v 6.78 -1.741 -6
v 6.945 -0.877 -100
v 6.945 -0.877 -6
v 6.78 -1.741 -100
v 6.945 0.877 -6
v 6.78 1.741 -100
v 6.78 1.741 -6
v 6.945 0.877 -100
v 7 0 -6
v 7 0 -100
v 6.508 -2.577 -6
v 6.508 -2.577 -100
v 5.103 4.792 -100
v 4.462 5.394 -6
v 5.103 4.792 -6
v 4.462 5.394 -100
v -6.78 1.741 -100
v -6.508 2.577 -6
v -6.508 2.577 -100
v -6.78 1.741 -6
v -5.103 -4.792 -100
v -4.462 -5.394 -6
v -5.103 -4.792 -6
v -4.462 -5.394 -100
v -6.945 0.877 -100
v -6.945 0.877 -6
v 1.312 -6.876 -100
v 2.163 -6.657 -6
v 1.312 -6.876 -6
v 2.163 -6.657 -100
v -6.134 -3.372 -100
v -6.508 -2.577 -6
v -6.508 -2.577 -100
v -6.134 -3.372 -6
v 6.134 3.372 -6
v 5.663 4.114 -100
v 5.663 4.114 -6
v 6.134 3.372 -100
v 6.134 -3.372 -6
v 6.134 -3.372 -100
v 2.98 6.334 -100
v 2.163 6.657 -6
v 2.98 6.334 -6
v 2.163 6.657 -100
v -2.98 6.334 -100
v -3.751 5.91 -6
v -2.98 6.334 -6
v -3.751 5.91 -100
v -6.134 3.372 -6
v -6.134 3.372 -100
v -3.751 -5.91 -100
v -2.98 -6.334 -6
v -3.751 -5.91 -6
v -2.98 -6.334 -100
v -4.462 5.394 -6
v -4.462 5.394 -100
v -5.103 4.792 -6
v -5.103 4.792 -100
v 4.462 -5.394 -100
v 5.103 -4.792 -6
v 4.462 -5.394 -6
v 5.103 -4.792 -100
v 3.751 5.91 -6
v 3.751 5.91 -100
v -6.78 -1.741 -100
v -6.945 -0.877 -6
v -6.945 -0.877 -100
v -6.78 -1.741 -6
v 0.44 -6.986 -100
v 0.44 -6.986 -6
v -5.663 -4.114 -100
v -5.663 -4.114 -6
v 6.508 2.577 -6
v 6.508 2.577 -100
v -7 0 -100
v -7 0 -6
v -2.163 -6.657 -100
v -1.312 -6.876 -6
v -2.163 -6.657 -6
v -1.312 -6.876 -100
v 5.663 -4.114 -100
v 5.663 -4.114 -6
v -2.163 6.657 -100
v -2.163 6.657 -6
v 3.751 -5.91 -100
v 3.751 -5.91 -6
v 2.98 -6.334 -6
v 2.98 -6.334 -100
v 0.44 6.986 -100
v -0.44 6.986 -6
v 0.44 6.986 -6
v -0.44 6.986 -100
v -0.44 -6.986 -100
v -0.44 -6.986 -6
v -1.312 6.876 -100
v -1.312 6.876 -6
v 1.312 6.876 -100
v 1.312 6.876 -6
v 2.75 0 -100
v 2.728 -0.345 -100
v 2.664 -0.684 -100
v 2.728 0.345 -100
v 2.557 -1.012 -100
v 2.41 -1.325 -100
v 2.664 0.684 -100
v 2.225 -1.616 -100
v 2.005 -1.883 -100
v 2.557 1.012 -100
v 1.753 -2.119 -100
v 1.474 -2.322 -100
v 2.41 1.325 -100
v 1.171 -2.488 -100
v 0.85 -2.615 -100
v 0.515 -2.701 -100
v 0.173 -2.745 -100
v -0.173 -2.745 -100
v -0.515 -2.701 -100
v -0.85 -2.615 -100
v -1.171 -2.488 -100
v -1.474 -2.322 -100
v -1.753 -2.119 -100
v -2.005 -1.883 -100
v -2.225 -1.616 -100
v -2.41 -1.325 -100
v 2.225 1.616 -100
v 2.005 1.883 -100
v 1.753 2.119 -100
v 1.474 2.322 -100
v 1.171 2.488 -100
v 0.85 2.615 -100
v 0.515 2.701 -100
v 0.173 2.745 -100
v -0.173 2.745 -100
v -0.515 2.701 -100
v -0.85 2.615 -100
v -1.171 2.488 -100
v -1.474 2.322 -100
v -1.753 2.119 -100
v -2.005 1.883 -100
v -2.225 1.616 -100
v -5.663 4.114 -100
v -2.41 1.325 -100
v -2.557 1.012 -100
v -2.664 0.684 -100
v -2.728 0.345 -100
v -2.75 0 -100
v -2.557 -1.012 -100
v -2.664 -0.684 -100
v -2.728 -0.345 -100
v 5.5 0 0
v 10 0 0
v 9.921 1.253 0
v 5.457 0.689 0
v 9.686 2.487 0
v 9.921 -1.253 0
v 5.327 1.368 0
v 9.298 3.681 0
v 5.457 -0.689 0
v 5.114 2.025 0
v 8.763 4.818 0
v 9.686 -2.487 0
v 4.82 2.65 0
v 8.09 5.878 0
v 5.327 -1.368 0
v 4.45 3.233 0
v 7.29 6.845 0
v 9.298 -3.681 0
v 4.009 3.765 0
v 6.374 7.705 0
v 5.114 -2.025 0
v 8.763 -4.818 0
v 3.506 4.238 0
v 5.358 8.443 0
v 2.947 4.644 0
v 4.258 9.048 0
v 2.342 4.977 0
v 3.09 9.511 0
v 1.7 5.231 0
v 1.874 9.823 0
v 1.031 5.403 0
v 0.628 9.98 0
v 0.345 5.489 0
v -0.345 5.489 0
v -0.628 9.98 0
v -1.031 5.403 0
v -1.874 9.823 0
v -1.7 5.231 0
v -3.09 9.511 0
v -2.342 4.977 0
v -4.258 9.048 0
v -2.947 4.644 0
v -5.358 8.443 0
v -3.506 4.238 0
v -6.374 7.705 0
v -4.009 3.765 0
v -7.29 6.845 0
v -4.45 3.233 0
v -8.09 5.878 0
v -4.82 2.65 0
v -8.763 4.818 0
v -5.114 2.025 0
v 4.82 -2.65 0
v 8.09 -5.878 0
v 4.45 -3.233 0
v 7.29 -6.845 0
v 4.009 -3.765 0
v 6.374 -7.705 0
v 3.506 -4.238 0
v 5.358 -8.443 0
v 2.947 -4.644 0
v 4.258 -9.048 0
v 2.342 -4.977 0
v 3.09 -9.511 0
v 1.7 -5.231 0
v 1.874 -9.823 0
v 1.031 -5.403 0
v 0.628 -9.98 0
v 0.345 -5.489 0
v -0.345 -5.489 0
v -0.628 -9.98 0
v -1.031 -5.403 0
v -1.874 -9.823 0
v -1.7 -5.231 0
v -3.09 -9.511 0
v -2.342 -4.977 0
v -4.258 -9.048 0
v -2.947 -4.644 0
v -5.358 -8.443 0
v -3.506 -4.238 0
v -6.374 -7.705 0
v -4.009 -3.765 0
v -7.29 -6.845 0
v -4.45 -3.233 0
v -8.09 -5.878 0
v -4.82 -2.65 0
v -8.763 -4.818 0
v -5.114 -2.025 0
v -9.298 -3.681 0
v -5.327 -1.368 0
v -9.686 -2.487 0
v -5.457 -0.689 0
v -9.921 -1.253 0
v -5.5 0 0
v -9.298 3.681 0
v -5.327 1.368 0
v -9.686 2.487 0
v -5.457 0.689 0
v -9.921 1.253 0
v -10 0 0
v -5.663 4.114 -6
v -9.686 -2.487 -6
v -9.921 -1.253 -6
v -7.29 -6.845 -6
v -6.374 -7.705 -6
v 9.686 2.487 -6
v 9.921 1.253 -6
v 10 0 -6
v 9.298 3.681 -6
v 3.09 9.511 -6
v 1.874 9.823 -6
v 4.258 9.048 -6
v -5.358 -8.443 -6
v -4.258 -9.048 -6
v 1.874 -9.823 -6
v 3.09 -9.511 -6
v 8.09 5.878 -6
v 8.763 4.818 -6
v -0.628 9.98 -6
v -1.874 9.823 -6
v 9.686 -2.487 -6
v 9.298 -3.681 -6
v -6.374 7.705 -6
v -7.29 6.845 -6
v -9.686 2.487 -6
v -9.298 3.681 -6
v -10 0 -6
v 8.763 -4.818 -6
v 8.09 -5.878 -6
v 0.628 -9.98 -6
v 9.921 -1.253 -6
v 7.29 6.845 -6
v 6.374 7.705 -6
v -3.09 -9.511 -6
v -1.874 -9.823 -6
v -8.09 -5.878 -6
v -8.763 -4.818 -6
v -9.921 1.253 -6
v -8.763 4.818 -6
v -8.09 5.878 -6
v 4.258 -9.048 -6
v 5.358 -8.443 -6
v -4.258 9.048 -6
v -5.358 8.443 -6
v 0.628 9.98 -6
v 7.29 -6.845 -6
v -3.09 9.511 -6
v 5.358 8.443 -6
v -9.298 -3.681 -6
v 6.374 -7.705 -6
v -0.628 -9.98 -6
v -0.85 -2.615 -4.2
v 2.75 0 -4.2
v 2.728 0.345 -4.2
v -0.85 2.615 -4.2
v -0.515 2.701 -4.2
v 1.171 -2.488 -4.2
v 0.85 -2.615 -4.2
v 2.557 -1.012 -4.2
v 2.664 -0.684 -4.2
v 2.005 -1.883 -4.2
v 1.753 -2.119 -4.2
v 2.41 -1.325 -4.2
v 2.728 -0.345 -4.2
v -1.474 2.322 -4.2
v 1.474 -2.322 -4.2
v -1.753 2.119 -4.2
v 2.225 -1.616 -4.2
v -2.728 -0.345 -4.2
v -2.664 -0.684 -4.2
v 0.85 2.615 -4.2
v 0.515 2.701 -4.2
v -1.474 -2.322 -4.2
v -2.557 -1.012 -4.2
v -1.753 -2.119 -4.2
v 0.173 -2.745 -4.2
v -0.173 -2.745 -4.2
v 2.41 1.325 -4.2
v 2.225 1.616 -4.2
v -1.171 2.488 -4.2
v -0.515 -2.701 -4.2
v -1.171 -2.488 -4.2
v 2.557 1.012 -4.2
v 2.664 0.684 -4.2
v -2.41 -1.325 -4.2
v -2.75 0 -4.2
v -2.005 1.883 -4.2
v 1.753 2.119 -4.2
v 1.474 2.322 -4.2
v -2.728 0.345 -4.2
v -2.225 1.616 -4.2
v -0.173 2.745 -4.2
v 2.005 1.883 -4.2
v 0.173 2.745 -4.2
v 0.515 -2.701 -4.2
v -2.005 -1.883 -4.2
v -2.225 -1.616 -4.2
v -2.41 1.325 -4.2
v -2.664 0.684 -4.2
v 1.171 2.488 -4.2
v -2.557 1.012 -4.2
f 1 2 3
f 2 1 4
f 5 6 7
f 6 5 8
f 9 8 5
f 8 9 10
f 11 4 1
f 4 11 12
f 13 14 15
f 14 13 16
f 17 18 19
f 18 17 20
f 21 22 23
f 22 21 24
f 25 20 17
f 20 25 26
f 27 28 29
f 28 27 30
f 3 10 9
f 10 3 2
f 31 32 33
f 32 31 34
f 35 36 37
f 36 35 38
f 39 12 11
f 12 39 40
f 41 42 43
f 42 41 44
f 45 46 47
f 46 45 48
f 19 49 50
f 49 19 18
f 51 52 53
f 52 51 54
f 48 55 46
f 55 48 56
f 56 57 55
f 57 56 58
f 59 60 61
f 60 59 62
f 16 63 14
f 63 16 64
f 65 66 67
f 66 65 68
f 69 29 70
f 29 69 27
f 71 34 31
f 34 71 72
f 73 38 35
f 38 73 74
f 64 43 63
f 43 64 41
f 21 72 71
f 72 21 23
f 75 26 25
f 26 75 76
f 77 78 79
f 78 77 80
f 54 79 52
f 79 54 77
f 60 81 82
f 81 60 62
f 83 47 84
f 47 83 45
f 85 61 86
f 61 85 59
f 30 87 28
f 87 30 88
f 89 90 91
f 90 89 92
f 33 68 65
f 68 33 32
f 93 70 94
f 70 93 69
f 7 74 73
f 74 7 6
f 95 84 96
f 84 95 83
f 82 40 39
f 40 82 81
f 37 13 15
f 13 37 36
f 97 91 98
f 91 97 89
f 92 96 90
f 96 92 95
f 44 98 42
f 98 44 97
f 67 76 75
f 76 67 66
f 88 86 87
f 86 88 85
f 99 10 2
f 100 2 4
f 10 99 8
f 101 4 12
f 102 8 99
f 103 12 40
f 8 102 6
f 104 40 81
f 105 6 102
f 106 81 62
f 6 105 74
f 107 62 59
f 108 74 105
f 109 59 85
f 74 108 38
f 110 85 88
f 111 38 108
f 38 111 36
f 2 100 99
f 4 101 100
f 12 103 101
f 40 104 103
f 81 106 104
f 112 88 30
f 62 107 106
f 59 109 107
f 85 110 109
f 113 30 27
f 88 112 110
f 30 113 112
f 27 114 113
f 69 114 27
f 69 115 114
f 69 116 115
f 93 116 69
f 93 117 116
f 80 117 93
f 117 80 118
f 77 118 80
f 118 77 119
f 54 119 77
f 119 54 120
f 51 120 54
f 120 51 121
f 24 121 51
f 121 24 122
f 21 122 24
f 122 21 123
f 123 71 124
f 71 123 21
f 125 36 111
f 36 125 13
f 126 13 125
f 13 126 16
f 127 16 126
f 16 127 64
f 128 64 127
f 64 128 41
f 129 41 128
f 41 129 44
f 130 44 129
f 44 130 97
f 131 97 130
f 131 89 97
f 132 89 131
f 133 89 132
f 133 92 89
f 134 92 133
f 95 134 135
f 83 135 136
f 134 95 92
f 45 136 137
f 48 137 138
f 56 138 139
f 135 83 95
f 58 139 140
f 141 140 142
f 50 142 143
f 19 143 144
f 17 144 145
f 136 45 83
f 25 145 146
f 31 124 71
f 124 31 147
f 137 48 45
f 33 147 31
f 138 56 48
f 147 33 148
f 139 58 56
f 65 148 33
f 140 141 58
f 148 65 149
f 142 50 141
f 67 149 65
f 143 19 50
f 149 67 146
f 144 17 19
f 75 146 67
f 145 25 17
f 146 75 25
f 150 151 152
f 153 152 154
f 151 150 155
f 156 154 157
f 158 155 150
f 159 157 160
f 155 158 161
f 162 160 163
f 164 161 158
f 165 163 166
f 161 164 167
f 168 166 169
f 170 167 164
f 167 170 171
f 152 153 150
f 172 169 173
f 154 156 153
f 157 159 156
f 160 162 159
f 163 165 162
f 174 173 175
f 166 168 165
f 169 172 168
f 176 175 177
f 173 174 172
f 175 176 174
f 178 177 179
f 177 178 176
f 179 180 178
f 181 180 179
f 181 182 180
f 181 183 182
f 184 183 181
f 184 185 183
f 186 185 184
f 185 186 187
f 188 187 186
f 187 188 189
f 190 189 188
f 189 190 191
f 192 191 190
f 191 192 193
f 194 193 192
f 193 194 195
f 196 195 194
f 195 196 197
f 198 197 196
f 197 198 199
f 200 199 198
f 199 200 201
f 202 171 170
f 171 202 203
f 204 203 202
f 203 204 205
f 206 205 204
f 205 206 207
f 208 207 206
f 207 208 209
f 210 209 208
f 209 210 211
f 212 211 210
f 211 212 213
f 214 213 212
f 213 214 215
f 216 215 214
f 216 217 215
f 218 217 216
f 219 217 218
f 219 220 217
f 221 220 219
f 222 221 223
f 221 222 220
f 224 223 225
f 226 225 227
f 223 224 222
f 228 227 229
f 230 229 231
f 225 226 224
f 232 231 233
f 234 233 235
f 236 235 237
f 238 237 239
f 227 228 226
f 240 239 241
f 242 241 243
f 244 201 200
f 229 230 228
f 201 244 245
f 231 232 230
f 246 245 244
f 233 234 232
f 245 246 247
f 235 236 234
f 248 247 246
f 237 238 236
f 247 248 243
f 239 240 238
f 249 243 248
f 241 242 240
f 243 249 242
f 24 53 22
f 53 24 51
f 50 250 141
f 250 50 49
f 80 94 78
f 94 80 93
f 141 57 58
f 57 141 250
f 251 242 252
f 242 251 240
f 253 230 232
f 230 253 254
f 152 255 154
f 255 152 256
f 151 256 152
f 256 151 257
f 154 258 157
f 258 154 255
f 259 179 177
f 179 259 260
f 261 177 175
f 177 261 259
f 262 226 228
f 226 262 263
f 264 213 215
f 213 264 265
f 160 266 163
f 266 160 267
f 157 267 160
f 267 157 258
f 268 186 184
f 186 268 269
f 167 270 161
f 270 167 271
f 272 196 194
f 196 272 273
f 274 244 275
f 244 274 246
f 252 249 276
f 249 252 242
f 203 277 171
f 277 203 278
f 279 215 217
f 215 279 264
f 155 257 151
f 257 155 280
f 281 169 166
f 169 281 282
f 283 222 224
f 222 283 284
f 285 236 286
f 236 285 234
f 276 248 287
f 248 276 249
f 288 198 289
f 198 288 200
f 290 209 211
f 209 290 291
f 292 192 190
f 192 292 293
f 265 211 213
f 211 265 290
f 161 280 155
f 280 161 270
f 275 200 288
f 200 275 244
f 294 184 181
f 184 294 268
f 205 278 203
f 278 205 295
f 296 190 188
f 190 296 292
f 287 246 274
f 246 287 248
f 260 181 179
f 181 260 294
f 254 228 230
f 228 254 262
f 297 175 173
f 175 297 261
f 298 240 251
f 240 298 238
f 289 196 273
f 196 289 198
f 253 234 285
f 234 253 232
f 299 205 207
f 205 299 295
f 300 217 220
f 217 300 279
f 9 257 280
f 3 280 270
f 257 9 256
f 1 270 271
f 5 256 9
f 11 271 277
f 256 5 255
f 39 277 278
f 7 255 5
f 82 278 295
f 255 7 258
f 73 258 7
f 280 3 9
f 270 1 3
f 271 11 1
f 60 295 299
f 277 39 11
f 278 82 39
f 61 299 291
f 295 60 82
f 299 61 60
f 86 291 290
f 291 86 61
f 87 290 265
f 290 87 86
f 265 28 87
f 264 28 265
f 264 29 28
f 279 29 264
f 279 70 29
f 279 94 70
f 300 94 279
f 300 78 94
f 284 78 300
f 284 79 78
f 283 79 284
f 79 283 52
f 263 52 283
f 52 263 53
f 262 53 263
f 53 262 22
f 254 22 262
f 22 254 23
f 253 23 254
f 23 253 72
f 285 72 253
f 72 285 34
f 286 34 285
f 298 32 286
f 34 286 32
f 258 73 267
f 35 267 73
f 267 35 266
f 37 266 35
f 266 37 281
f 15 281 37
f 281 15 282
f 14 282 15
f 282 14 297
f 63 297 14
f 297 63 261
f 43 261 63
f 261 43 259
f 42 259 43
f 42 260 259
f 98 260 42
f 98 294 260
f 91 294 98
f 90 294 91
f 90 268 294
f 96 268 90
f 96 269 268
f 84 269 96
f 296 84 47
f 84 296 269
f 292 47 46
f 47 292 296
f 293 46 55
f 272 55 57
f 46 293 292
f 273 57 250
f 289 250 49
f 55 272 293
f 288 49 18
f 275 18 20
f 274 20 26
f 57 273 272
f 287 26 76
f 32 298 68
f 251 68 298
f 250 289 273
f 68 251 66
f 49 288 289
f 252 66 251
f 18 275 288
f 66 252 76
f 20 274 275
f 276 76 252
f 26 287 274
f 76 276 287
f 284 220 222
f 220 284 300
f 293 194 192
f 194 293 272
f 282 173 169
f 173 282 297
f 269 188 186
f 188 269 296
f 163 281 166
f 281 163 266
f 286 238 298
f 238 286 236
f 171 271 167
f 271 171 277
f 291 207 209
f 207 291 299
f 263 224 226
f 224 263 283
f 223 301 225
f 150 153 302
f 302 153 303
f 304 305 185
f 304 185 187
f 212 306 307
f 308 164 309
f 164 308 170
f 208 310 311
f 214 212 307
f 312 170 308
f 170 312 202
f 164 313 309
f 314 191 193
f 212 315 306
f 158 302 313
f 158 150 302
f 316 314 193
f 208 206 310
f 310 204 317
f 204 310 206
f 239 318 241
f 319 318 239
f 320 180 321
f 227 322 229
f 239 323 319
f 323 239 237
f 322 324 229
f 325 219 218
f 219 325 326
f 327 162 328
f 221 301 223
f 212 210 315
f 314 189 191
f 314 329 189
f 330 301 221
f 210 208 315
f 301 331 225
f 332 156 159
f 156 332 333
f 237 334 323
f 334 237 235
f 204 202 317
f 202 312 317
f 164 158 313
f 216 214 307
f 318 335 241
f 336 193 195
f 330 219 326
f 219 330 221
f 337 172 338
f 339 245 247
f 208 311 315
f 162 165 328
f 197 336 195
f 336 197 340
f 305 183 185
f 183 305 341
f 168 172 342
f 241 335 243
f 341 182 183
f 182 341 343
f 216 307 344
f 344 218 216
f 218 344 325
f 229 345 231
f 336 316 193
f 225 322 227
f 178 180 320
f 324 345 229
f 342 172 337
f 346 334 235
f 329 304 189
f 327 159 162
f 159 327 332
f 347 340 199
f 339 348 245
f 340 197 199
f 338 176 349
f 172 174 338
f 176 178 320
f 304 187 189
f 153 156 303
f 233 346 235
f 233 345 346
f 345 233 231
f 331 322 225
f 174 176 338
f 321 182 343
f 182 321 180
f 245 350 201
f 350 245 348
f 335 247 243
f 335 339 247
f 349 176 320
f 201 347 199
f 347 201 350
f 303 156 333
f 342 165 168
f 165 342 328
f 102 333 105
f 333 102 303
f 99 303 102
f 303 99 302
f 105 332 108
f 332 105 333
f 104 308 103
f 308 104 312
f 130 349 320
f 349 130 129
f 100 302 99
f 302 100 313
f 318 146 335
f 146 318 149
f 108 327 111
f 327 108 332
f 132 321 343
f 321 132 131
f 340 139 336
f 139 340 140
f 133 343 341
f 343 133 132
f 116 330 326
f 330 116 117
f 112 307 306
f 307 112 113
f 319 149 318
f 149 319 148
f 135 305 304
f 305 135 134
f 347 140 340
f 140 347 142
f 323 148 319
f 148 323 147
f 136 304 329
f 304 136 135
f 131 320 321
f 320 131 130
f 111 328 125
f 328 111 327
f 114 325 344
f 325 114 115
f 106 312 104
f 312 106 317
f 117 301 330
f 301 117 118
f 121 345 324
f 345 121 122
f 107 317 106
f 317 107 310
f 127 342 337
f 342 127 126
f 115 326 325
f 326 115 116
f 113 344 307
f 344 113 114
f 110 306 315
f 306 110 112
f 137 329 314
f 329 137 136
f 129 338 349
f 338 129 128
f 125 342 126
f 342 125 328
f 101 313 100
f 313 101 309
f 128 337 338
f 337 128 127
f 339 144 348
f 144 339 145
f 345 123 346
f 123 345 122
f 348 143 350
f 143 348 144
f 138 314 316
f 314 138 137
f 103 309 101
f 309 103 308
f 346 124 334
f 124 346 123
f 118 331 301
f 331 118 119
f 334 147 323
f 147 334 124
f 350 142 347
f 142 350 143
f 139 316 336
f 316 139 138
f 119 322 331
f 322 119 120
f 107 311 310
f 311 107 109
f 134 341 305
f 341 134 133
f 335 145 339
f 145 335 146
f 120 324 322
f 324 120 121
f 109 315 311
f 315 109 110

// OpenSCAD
$fn = 50;


difference() {
	union() {
		translate(v = [0, 0, -100.0000000000]) {
			cylinder(h = 100, r = 7.0000000000);
		}
		translate(v = [0, 0, -6.0000000000]) {
			cylinder(h = 6, r = 10.0000000000);
		}
	}
	union() {
		translate(v = [0, 0, 0]) {
			rotate(a = [0, 0, 0]) {
				difference() {
					union() {
						#translate(v = [0, 0, -100.0000000000]) {
							cylinder(h = 100, r = 2.2500000000);
						}
						#translate(v = [0, 0, -4.2000000000]) {
							cylinder(h = 4.2000000000, r1 = 2.7500000000, r2 = 5.5000000000);
						}
						#translate(v = [0, 0, -100.0000000000]) {
							cylinder(h = 100, r = 2.7500000000);
						}
						#translate(v = [0, 0, -100.0000000000]) {
							cylinder(h = 100, r = 2.2500000000);
						}
					}
					union();
				}
			}
		}
	}
}
